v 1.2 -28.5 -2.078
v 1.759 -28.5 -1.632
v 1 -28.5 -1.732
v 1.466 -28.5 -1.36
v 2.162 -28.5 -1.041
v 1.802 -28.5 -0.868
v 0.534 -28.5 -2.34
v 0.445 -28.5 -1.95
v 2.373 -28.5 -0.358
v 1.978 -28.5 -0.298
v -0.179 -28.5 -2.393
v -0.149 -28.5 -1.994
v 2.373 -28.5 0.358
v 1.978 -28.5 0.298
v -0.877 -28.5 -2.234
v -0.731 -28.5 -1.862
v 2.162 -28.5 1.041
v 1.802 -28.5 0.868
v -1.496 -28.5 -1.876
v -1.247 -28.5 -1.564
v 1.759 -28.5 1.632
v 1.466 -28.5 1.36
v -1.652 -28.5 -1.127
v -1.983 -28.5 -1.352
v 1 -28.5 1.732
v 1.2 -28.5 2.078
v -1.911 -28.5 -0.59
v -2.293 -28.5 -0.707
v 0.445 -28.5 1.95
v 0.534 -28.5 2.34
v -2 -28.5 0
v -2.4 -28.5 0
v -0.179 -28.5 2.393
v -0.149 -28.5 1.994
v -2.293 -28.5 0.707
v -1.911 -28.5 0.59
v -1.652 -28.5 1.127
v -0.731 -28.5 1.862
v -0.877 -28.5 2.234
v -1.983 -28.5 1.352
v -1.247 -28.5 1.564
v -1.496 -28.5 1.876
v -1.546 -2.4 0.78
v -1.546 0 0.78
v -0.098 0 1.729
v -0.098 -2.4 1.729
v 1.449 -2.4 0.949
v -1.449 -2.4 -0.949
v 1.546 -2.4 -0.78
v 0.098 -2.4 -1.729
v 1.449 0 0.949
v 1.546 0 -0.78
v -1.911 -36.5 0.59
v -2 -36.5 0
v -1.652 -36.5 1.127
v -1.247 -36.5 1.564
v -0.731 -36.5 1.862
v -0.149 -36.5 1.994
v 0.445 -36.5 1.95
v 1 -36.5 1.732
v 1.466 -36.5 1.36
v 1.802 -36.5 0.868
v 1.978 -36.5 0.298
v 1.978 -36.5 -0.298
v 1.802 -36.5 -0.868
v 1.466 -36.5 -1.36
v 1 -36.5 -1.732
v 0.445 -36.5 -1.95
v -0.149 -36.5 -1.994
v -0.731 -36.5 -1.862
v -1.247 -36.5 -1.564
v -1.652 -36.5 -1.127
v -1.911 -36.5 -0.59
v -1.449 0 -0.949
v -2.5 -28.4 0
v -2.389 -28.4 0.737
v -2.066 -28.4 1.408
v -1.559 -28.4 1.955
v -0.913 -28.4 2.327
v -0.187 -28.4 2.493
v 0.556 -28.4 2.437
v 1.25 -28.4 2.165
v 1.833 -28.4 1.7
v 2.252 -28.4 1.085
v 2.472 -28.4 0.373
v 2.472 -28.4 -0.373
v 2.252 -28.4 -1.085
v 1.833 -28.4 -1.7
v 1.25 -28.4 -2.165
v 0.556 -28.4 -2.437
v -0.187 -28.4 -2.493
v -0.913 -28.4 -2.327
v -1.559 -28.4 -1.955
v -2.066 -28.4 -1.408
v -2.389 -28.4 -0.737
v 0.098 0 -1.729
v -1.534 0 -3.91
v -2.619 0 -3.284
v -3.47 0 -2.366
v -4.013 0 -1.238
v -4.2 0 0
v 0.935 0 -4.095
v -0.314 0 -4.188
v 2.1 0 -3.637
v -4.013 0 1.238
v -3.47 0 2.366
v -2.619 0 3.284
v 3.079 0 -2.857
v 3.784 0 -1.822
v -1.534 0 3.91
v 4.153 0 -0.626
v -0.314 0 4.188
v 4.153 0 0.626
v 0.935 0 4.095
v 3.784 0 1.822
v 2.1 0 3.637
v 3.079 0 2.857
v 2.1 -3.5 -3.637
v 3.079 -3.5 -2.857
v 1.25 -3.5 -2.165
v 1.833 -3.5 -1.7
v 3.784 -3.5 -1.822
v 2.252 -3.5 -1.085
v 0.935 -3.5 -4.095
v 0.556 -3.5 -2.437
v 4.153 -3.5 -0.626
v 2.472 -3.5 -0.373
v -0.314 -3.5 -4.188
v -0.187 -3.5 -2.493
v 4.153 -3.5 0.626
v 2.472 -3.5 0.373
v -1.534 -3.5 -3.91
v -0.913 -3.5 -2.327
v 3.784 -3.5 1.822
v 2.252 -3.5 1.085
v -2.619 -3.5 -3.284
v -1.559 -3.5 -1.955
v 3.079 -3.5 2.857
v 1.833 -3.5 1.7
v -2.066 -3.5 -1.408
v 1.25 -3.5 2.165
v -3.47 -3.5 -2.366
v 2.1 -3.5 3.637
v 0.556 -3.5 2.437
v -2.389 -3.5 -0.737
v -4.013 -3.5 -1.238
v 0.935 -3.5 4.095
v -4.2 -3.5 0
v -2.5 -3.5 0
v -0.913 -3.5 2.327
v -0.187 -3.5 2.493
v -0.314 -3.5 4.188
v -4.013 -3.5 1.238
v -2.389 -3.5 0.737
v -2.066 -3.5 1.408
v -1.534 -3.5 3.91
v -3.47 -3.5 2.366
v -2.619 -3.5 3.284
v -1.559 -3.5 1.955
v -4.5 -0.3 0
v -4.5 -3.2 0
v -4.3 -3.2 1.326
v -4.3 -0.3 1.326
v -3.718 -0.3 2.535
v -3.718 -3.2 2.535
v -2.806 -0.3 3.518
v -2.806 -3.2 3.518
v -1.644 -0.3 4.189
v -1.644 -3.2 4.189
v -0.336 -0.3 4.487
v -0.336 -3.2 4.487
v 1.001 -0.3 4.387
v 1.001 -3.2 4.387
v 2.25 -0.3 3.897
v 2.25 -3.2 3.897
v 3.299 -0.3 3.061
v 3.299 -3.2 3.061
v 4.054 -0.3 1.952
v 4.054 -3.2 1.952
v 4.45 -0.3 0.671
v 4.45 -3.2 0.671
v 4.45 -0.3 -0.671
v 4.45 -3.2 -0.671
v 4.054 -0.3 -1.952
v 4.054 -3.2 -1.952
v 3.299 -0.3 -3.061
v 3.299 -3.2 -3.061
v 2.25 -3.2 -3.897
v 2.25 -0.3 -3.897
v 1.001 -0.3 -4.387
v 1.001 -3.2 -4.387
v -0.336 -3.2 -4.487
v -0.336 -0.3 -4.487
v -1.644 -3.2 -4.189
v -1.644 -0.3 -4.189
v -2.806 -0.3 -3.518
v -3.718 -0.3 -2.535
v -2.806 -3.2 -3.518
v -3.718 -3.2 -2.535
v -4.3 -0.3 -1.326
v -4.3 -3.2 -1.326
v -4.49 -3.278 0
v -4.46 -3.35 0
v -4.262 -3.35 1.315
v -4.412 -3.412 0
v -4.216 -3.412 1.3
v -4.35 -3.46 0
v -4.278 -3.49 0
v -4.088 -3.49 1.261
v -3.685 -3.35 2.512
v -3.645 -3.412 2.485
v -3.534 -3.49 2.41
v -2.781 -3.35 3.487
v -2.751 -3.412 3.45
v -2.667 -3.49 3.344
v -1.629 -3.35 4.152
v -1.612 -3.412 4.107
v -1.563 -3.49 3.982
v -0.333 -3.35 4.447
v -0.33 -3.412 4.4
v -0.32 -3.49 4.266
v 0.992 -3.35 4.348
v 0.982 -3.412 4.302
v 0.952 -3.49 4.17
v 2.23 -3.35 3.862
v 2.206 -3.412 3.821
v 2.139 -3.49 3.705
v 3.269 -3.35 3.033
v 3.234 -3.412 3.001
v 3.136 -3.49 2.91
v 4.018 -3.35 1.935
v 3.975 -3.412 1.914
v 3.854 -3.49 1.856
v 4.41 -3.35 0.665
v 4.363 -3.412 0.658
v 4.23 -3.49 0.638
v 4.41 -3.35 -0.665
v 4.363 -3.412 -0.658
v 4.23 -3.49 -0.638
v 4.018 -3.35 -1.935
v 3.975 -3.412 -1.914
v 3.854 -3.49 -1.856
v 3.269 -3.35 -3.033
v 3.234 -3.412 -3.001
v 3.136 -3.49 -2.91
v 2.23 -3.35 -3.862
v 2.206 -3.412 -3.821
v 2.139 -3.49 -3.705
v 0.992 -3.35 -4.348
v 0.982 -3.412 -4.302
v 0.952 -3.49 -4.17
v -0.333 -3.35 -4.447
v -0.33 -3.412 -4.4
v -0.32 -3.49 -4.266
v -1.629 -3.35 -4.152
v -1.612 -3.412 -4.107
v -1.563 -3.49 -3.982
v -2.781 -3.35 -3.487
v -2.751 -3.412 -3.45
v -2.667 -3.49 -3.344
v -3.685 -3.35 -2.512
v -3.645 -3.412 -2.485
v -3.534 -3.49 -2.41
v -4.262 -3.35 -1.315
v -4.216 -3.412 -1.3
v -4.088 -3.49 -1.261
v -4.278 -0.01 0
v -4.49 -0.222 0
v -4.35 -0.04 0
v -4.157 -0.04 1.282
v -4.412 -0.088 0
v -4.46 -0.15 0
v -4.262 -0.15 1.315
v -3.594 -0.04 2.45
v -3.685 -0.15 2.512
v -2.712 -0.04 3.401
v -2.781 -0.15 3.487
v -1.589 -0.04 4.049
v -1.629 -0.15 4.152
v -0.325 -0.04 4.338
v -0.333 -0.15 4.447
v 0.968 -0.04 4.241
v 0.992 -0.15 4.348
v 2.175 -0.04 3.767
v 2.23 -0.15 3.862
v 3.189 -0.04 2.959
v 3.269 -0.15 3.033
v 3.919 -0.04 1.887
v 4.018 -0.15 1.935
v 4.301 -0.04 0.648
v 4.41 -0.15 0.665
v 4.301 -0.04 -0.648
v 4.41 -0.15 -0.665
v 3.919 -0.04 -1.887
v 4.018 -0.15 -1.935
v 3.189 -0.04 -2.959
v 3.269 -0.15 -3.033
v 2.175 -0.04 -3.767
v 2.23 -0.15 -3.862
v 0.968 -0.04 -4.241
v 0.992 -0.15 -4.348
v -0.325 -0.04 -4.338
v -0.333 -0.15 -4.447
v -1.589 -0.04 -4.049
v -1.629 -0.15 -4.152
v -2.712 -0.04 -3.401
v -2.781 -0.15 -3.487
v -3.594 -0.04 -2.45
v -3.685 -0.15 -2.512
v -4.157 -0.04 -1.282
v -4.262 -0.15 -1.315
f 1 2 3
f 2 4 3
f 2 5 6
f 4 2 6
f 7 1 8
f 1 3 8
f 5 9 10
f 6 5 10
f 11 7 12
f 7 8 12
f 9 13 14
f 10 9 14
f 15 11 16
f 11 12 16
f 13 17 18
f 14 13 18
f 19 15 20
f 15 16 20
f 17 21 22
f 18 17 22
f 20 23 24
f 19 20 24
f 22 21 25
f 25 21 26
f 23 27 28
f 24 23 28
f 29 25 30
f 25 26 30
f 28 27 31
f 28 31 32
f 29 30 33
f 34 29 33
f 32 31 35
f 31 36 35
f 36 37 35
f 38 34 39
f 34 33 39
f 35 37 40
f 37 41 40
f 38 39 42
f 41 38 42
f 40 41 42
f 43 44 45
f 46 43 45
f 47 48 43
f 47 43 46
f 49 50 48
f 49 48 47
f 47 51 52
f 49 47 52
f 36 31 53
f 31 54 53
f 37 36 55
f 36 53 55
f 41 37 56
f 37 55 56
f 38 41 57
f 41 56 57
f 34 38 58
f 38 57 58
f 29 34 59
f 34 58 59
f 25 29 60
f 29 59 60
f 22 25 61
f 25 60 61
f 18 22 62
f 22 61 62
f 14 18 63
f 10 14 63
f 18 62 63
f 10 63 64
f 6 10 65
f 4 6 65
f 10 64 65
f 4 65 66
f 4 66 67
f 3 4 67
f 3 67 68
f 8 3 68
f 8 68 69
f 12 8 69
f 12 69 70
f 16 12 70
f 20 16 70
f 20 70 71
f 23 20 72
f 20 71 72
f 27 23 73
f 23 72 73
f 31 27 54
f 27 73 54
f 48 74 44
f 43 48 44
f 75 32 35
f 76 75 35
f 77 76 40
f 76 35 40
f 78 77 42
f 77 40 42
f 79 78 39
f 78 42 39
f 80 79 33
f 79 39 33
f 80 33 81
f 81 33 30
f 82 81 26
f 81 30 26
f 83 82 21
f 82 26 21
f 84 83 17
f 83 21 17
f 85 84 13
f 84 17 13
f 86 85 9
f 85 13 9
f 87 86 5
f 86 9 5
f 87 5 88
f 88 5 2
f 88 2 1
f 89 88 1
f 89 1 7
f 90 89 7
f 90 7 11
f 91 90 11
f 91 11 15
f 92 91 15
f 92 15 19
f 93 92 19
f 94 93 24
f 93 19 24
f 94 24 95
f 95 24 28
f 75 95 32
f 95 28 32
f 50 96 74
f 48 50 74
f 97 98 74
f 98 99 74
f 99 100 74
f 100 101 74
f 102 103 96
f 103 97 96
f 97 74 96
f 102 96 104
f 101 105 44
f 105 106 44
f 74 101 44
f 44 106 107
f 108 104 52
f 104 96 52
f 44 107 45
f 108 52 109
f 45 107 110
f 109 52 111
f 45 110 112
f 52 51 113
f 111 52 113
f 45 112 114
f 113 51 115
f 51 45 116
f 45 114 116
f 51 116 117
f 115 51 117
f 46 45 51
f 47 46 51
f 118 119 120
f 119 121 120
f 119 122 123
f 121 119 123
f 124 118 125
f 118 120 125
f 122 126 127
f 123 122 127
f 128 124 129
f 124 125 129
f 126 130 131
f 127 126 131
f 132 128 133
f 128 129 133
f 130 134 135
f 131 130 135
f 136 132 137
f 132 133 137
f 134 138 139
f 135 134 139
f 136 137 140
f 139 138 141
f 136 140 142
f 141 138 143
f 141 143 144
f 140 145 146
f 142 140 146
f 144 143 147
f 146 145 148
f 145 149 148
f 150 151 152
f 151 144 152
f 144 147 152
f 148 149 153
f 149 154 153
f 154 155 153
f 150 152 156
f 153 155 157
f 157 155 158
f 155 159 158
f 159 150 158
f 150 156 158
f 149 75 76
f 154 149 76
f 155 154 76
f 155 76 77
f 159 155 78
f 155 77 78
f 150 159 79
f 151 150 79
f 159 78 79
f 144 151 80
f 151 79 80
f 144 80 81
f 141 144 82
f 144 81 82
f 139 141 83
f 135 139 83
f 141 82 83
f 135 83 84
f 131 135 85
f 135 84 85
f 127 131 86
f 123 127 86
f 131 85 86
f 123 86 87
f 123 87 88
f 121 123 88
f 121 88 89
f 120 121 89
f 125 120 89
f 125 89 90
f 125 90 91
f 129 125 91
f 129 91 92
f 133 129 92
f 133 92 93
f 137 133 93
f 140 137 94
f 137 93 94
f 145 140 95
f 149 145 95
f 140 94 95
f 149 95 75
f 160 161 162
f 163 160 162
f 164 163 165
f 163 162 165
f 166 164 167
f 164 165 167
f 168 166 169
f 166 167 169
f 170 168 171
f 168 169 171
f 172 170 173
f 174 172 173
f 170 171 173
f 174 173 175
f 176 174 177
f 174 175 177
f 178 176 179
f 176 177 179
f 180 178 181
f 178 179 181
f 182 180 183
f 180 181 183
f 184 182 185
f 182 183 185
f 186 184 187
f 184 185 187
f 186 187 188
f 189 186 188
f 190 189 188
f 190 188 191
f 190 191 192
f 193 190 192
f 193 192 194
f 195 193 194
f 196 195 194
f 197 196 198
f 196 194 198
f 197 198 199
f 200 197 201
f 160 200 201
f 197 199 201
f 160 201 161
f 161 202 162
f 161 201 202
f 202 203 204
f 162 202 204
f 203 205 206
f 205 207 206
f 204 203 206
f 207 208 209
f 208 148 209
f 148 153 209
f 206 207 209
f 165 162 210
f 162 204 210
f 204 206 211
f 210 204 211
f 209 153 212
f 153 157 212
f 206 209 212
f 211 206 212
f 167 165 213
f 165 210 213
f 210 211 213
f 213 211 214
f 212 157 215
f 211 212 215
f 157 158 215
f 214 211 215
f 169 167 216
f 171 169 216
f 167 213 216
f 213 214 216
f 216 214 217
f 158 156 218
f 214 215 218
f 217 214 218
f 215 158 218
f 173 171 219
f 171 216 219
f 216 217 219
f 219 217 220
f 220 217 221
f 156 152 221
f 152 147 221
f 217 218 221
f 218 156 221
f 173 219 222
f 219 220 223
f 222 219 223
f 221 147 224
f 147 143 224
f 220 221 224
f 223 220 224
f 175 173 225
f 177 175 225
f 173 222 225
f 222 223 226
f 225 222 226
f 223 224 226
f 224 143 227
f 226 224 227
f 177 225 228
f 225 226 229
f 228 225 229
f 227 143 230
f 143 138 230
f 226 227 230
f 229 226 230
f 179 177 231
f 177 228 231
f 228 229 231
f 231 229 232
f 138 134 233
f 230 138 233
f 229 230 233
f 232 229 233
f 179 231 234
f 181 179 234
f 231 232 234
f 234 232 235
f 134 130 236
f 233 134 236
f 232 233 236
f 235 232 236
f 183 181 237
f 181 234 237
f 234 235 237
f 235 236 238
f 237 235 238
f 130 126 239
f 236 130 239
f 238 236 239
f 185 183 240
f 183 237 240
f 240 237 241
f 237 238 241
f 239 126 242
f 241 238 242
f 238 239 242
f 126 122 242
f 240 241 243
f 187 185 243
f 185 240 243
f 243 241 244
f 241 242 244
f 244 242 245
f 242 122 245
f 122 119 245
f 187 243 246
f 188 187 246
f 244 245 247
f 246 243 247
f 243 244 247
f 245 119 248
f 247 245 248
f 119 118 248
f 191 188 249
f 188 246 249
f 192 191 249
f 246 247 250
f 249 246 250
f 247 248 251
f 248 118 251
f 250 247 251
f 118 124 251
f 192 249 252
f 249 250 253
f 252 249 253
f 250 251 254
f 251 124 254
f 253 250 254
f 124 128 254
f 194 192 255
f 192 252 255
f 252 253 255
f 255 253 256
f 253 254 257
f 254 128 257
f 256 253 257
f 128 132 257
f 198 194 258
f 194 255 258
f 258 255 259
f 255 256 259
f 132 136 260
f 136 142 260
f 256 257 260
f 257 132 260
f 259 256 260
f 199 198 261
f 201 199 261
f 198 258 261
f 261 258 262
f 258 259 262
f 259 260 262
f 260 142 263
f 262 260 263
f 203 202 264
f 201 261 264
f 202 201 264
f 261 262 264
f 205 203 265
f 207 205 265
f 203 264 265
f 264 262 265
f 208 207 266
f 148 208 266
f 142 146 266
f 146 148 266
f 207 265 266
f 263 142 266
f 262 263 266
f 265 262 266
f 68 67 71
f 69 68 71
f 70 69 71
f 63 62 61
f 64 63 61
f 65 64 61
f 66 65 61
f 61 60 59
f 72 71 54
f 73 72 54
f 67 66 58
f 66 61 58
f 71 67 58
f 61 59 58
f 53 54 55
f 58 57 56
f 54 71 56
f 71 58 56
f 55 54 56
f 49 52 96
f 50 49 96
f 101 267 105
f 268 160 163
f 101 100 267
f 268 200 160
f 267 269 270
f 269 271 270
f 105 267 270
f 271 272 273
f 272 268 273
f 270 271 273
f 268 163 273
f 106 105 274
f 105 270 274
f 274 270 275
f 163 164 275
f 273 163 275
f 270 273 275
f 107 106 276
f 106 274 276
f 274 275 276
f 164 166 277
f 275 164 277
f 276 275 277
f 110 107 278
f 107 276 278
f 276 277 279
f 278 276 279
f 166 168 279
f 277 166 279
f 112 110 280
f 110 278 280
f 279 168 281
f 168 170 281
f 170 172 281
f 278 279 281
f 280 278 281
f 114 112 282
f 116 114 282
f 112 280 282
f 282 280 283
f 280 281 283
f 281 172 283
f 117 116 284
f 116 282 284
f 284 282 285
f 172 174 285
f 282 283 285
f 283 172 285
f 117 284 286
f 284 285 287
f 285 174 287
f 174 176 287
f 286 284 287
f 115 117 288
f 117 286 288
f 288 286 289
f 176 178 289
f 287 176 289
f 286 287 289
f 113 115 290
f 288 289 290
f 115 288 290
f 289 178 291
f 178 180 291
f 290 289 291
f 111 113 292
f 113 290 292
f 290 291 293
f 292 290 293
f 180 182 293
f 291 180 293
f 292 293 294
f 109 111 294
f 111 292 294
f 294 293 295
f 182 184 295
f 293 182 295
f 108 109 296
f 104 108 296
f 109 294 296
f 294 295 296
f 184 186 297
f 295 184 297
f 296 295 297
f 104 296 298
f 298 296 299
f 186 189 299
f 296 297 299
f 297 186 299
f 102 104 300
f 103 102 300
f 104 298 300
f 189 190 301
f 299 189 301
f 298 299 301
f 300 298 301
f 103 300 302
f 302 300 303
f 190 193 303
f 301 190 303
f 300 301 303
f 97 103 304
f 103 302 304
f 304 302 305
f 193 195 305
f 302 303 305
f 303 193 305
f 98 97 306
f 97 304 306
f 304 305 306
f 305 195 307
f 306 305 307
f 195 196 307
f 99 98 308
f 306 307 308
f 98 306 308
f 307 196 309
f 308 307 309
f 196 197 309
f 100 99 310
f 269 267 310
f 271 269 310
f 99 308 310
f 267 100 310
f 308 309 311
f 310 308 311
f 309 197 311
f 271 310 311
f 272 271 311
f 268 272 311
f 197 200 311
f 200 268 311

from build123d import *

# Parameters (mm, degrees)
FILLET_2_R          = 0.3
CUT_EXTRUDE_1_DEPTH = 2.4
CHAMFER_2_SIZE      = 0.1


with BuildPart() as part:
    # 草图1 → 旋转1 (revolve)
    with BuildSketch(Plane.XY):
        Polygon((0, 0), (-4.5, 0), (-4.5, -3.5), (-2.5, -3.5), (-2.5, -28.5), (-2, -28.5), (-2, -36.5), (0, -36.5), align=None)
    revolve(axis=Axis((0, -36.5, 0), (0, 1, 0)))

    # 圆角2
    fillet_2_edges = [part.edges().sort_by_distance(p)[0] for p in [
        (4.5, -3.5, 0),
        (4.5, 0, 0),
    ]]
    fillet(fillet_2_edges, radius=FILLET_2_R)

    # 草图2 → 切除-拉伸1 (cut)
    with BuildSketch(Plane(origin=(0, 0, 0), x_dir=(1, 0, 0), z_dir=(0, 1, 0))):
        Polygon((1.448722053, -0.949317867), (1.546494416, 0.779971167), (0.097772363, 1.729289035), (-1.448722053, 0.949317867), (-1.546494416, -0.779971167), (-0.097772363, -1.729289035), align=None)
    extrude(amount=-CUT_EXTRUDE_1_DEPTH, mode=Mode.SUBTRACT)

    # 倒角2
    chamfer_2_edges = [part.edges().sort_by_distance(p)[0] for p in [
        (2.5, -28.5, 0),
    ]]
    chamfer(chamfer_2_edges, length=CHAMFER_2_SIZE)


solid = part.part
